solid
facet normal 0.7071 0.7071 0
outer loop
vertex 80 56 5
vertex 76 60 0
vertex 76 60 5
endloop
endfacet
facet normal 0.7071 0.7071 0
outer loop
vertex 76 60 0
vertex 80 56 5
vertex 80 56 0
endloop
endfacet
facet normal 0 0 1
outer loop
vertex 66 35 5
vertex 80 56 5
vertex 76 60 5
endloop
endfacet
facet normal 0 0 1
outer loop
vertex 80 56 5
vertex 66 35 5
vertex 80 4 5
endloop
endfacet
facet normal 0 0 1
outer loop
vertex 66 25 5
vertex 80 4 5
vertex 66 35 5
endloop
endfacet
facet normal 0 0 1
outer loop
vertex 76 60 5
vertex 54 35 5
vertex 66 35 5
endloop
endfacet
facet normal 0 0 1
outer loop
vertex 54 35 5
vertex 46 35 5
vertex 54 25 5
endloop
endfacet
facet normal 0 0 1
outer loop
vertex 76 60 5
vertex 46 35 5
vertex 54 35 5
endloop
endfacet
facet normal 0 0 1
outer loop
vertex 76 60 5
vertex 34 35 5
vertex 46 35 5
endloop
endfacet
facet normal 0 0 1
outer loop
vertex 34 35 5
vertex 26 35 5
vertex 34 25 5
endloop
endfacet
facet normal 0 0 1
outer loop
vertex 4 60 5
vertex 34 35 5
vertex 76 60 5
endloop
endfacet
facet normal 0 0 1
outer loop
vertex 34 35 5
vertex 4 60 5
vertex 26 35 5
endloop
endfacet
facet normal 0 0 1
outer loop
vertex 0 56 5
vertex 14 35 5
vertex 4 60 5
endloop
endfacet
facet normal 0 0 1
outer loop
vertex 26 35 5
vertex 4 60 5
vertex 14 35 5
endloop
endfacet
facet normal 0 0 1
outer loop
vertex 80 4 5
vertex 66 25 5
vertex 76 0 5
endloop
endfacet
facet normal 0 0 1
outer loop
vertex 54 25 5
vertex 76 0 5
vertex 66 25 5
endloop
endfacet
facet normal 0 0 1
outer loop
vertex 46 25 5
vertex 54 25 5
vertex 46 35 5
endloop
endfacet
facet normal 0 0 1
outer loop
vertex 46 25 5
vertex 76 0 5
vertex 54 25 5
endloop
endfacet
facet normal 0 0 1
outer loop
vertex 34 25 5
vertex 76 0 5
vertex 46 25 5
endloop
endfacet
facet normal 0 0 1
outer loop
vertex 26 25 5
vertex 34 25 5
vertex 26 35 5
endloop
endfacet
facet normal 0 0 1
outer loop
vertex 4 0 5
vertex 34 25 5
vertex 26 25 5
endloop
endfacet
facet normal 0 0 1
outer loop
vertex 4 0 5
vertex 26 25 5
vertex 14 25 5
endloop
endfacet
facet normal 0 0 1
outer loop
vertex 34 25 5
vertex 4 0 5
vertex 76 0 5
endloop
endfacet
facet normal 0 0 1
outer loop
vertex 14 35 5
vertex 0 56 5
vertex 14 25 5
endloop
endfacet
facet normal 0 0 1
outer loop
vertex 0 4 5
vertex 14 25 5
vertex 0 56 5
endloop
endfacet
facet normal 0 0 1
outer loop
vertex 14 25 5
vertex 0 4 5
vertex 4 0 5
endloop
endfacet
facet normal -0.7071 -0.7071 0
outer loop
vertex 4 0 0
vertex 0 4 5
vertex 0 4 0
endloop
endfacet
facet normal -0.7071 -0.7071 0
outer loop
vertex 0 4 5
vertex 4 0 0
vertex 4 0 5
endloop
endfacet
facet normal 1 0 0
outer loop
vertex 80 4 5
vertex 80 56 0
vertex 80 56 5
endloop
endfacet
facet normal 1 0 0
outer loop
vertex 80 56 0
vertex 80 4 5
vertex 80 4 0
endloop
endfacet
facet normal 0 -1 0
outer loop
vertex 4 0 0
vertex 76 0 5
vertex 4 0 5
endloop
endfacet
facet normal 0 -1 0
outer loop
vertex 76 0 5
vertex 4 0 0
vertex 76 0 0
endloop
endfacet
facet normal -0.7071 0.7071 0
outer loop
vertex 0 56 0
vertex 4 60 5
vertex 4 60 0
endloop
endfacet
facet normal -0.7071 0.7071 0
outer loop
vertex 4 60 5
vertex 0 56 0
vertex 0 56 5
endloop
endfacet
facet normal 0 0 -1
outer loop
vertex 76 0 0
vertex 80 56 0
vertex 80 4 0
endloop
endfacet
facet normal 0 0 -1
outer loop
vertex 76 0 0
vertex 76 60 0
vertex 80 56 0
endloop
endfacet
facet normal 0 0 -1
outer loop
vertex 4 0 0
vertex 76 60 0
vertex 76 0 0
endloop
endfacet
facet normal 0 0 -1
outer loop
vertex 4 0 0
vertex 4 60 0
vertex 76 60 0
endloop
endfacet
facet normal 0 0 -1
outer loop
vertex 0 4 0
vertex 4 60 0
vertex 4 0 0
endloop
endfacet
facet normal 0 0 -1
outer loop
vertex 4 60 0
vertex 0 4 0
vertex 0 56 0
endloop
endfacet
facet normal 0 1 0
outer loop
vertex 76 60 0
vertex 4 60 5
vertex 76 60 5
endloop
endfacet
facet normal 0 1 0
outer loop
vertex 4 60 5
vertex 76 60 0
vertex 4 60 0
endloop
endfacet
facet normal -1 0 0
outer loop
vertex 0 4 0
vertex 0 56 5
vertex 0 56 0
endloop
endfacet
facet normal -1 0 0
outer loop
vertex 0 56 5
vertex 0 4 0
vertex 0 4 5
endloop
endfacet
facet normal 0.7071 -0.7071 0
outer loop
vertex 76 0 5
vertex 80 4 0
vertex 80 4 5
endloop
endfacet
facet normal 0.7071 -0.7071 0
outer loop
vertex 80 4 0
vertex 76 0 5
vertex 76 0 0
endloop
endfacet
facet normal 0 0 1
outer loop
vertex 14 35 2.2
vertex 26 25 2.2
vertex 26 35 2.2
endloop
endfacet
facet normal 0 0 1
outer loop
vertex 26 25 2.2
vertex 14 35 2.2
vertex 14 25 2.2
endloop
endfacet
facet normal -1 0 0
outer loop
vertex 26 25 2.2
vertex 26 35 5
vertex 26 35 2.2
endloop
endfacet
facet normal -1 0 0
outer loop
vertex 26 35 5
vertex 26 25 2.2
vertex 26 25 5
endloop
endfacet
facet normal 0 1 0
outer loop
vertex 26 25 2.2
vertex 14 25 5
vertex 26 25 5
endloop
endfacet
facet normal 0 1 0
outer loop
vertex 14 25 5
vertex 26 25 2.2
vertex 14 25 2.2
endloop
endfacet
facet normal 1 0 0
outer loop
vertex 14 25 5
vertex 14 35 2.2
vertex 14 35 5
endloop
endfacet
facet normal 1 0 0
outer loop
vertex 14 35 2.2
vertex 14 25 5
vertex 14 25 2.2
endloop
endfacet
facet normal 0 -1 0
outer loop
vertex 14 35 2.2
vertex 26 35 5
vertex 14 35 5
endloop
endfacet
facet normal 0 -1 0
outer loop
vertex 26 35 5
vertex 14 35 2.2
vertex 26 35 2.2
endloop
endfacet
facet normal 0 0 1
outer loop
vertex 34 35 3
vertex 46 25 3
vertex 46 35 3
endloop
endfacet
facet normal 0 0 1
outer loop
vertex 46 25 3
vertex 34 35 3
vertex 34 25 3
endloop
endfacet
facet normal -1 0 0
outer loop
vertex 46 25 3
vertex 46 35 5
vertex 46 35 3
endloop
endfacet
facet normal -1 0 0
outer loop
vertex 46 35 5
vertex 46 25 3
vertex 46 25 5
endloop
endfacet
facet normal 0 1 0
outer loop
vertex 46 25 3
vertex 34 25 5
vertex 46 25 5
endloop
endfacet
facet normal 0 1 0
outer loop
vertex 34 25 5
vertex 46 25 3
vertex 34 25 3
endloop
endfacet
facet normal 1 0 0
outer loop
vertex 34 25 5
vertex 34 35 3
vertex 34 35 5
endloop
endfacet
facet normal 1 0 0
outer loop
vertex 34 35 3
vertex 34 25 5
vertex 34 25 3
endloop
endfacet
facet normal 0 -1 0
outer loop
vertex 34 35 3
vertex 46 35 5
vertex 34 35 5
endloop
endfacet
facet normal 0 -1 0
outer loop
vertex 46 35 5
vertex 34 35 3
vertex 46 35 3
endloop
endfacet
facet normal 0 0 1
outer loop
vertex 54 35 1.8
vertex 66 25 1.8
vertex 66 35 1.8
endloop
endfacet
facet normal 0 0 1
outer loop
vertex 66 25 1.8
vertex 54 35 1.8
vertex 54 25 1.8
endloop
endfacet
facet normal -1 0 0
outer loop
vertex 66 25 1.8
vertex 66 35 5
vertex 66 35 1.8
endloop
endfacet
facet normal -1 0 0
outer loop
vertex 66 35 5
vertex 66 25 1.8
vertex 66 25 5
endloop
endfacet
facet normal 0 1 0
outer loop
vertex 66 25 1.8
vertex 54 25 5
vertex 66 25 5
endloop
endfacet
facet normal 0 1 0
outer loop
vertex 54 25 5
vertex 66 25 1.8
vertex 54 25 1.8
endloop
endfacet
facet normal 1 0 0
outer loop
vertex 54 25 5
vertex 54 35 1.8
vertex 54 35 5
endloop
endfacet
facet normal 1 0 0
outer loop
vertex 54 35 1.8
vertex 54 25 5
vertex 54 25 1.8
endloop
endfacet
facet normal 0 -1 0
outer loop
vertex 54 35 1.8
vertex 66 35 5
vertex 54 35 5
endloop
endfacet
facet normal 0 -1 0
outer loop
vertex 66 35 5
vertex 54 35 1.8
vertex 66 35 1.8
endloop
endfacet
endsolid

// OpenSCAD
$fn = 32;

// ----------------------------------------------------------------------
// Windowed plate: 3 voids, 80 x 60 x 5 mm
// ----------------------------------------------------------------------

// --- parameters (mm) ---
plate_l = 80;             // plate length, X
plate_w = 60;             // plate width, Y
plate_t = 5;              // plate thickness, Z
edge_margin = 10;         // wall from the plate edge to any window
windows = 3;              // number of windows in the row
win_l = 12;               // window length
win_w = 10;               // window width
win_pitch = 20;           // window pitch along X
depth_1 = 2.8;            // depth of void 1 (full thickness = through)
depth_2 = 2;              // depth of void 2 (full thickness = through)
depth_3 = 3.2;            // depth of void 3 (full thickness = through)
corner_c = 4;             // corner chamfer of the plate

profile = [[4, 0], [76, 0], [80, 4], [80, 56], [76, 60], [4, 60], [0, 56], [0, 4]];  // primary outline, 8 points, counter clockwise
void_1 = [[14, 25], [26, 25], [26, 35], [14, 35]];  // window 1 of the row, 4 points
void_2 = [[34, 25], [46, 25], [46, 35], [34, 35]];  // window 2 of the row, 4 points
void_3 = [[54, 25], [66, 25], [66, 35], [54, 35]];  // window 3 of the row, 4 points

// --- the one profile operation ---
difference() {
  linear_extrude(height = plate_t) polygon(points = profile);
  translate([0, 0, plate_t - depth_1])
    linear_extrude(height = depth_1 + 1) polygon(points = void_1);
  translate([0, 0, plate_t - depth_2])
    linear_extrude(height = depth_2 + 1) polygon(points = void_2);
  translate([0, 0, plate_t - depth_3])
    linear_extrude(height = depth_3 + 1) polygon(points = void_3);
}
